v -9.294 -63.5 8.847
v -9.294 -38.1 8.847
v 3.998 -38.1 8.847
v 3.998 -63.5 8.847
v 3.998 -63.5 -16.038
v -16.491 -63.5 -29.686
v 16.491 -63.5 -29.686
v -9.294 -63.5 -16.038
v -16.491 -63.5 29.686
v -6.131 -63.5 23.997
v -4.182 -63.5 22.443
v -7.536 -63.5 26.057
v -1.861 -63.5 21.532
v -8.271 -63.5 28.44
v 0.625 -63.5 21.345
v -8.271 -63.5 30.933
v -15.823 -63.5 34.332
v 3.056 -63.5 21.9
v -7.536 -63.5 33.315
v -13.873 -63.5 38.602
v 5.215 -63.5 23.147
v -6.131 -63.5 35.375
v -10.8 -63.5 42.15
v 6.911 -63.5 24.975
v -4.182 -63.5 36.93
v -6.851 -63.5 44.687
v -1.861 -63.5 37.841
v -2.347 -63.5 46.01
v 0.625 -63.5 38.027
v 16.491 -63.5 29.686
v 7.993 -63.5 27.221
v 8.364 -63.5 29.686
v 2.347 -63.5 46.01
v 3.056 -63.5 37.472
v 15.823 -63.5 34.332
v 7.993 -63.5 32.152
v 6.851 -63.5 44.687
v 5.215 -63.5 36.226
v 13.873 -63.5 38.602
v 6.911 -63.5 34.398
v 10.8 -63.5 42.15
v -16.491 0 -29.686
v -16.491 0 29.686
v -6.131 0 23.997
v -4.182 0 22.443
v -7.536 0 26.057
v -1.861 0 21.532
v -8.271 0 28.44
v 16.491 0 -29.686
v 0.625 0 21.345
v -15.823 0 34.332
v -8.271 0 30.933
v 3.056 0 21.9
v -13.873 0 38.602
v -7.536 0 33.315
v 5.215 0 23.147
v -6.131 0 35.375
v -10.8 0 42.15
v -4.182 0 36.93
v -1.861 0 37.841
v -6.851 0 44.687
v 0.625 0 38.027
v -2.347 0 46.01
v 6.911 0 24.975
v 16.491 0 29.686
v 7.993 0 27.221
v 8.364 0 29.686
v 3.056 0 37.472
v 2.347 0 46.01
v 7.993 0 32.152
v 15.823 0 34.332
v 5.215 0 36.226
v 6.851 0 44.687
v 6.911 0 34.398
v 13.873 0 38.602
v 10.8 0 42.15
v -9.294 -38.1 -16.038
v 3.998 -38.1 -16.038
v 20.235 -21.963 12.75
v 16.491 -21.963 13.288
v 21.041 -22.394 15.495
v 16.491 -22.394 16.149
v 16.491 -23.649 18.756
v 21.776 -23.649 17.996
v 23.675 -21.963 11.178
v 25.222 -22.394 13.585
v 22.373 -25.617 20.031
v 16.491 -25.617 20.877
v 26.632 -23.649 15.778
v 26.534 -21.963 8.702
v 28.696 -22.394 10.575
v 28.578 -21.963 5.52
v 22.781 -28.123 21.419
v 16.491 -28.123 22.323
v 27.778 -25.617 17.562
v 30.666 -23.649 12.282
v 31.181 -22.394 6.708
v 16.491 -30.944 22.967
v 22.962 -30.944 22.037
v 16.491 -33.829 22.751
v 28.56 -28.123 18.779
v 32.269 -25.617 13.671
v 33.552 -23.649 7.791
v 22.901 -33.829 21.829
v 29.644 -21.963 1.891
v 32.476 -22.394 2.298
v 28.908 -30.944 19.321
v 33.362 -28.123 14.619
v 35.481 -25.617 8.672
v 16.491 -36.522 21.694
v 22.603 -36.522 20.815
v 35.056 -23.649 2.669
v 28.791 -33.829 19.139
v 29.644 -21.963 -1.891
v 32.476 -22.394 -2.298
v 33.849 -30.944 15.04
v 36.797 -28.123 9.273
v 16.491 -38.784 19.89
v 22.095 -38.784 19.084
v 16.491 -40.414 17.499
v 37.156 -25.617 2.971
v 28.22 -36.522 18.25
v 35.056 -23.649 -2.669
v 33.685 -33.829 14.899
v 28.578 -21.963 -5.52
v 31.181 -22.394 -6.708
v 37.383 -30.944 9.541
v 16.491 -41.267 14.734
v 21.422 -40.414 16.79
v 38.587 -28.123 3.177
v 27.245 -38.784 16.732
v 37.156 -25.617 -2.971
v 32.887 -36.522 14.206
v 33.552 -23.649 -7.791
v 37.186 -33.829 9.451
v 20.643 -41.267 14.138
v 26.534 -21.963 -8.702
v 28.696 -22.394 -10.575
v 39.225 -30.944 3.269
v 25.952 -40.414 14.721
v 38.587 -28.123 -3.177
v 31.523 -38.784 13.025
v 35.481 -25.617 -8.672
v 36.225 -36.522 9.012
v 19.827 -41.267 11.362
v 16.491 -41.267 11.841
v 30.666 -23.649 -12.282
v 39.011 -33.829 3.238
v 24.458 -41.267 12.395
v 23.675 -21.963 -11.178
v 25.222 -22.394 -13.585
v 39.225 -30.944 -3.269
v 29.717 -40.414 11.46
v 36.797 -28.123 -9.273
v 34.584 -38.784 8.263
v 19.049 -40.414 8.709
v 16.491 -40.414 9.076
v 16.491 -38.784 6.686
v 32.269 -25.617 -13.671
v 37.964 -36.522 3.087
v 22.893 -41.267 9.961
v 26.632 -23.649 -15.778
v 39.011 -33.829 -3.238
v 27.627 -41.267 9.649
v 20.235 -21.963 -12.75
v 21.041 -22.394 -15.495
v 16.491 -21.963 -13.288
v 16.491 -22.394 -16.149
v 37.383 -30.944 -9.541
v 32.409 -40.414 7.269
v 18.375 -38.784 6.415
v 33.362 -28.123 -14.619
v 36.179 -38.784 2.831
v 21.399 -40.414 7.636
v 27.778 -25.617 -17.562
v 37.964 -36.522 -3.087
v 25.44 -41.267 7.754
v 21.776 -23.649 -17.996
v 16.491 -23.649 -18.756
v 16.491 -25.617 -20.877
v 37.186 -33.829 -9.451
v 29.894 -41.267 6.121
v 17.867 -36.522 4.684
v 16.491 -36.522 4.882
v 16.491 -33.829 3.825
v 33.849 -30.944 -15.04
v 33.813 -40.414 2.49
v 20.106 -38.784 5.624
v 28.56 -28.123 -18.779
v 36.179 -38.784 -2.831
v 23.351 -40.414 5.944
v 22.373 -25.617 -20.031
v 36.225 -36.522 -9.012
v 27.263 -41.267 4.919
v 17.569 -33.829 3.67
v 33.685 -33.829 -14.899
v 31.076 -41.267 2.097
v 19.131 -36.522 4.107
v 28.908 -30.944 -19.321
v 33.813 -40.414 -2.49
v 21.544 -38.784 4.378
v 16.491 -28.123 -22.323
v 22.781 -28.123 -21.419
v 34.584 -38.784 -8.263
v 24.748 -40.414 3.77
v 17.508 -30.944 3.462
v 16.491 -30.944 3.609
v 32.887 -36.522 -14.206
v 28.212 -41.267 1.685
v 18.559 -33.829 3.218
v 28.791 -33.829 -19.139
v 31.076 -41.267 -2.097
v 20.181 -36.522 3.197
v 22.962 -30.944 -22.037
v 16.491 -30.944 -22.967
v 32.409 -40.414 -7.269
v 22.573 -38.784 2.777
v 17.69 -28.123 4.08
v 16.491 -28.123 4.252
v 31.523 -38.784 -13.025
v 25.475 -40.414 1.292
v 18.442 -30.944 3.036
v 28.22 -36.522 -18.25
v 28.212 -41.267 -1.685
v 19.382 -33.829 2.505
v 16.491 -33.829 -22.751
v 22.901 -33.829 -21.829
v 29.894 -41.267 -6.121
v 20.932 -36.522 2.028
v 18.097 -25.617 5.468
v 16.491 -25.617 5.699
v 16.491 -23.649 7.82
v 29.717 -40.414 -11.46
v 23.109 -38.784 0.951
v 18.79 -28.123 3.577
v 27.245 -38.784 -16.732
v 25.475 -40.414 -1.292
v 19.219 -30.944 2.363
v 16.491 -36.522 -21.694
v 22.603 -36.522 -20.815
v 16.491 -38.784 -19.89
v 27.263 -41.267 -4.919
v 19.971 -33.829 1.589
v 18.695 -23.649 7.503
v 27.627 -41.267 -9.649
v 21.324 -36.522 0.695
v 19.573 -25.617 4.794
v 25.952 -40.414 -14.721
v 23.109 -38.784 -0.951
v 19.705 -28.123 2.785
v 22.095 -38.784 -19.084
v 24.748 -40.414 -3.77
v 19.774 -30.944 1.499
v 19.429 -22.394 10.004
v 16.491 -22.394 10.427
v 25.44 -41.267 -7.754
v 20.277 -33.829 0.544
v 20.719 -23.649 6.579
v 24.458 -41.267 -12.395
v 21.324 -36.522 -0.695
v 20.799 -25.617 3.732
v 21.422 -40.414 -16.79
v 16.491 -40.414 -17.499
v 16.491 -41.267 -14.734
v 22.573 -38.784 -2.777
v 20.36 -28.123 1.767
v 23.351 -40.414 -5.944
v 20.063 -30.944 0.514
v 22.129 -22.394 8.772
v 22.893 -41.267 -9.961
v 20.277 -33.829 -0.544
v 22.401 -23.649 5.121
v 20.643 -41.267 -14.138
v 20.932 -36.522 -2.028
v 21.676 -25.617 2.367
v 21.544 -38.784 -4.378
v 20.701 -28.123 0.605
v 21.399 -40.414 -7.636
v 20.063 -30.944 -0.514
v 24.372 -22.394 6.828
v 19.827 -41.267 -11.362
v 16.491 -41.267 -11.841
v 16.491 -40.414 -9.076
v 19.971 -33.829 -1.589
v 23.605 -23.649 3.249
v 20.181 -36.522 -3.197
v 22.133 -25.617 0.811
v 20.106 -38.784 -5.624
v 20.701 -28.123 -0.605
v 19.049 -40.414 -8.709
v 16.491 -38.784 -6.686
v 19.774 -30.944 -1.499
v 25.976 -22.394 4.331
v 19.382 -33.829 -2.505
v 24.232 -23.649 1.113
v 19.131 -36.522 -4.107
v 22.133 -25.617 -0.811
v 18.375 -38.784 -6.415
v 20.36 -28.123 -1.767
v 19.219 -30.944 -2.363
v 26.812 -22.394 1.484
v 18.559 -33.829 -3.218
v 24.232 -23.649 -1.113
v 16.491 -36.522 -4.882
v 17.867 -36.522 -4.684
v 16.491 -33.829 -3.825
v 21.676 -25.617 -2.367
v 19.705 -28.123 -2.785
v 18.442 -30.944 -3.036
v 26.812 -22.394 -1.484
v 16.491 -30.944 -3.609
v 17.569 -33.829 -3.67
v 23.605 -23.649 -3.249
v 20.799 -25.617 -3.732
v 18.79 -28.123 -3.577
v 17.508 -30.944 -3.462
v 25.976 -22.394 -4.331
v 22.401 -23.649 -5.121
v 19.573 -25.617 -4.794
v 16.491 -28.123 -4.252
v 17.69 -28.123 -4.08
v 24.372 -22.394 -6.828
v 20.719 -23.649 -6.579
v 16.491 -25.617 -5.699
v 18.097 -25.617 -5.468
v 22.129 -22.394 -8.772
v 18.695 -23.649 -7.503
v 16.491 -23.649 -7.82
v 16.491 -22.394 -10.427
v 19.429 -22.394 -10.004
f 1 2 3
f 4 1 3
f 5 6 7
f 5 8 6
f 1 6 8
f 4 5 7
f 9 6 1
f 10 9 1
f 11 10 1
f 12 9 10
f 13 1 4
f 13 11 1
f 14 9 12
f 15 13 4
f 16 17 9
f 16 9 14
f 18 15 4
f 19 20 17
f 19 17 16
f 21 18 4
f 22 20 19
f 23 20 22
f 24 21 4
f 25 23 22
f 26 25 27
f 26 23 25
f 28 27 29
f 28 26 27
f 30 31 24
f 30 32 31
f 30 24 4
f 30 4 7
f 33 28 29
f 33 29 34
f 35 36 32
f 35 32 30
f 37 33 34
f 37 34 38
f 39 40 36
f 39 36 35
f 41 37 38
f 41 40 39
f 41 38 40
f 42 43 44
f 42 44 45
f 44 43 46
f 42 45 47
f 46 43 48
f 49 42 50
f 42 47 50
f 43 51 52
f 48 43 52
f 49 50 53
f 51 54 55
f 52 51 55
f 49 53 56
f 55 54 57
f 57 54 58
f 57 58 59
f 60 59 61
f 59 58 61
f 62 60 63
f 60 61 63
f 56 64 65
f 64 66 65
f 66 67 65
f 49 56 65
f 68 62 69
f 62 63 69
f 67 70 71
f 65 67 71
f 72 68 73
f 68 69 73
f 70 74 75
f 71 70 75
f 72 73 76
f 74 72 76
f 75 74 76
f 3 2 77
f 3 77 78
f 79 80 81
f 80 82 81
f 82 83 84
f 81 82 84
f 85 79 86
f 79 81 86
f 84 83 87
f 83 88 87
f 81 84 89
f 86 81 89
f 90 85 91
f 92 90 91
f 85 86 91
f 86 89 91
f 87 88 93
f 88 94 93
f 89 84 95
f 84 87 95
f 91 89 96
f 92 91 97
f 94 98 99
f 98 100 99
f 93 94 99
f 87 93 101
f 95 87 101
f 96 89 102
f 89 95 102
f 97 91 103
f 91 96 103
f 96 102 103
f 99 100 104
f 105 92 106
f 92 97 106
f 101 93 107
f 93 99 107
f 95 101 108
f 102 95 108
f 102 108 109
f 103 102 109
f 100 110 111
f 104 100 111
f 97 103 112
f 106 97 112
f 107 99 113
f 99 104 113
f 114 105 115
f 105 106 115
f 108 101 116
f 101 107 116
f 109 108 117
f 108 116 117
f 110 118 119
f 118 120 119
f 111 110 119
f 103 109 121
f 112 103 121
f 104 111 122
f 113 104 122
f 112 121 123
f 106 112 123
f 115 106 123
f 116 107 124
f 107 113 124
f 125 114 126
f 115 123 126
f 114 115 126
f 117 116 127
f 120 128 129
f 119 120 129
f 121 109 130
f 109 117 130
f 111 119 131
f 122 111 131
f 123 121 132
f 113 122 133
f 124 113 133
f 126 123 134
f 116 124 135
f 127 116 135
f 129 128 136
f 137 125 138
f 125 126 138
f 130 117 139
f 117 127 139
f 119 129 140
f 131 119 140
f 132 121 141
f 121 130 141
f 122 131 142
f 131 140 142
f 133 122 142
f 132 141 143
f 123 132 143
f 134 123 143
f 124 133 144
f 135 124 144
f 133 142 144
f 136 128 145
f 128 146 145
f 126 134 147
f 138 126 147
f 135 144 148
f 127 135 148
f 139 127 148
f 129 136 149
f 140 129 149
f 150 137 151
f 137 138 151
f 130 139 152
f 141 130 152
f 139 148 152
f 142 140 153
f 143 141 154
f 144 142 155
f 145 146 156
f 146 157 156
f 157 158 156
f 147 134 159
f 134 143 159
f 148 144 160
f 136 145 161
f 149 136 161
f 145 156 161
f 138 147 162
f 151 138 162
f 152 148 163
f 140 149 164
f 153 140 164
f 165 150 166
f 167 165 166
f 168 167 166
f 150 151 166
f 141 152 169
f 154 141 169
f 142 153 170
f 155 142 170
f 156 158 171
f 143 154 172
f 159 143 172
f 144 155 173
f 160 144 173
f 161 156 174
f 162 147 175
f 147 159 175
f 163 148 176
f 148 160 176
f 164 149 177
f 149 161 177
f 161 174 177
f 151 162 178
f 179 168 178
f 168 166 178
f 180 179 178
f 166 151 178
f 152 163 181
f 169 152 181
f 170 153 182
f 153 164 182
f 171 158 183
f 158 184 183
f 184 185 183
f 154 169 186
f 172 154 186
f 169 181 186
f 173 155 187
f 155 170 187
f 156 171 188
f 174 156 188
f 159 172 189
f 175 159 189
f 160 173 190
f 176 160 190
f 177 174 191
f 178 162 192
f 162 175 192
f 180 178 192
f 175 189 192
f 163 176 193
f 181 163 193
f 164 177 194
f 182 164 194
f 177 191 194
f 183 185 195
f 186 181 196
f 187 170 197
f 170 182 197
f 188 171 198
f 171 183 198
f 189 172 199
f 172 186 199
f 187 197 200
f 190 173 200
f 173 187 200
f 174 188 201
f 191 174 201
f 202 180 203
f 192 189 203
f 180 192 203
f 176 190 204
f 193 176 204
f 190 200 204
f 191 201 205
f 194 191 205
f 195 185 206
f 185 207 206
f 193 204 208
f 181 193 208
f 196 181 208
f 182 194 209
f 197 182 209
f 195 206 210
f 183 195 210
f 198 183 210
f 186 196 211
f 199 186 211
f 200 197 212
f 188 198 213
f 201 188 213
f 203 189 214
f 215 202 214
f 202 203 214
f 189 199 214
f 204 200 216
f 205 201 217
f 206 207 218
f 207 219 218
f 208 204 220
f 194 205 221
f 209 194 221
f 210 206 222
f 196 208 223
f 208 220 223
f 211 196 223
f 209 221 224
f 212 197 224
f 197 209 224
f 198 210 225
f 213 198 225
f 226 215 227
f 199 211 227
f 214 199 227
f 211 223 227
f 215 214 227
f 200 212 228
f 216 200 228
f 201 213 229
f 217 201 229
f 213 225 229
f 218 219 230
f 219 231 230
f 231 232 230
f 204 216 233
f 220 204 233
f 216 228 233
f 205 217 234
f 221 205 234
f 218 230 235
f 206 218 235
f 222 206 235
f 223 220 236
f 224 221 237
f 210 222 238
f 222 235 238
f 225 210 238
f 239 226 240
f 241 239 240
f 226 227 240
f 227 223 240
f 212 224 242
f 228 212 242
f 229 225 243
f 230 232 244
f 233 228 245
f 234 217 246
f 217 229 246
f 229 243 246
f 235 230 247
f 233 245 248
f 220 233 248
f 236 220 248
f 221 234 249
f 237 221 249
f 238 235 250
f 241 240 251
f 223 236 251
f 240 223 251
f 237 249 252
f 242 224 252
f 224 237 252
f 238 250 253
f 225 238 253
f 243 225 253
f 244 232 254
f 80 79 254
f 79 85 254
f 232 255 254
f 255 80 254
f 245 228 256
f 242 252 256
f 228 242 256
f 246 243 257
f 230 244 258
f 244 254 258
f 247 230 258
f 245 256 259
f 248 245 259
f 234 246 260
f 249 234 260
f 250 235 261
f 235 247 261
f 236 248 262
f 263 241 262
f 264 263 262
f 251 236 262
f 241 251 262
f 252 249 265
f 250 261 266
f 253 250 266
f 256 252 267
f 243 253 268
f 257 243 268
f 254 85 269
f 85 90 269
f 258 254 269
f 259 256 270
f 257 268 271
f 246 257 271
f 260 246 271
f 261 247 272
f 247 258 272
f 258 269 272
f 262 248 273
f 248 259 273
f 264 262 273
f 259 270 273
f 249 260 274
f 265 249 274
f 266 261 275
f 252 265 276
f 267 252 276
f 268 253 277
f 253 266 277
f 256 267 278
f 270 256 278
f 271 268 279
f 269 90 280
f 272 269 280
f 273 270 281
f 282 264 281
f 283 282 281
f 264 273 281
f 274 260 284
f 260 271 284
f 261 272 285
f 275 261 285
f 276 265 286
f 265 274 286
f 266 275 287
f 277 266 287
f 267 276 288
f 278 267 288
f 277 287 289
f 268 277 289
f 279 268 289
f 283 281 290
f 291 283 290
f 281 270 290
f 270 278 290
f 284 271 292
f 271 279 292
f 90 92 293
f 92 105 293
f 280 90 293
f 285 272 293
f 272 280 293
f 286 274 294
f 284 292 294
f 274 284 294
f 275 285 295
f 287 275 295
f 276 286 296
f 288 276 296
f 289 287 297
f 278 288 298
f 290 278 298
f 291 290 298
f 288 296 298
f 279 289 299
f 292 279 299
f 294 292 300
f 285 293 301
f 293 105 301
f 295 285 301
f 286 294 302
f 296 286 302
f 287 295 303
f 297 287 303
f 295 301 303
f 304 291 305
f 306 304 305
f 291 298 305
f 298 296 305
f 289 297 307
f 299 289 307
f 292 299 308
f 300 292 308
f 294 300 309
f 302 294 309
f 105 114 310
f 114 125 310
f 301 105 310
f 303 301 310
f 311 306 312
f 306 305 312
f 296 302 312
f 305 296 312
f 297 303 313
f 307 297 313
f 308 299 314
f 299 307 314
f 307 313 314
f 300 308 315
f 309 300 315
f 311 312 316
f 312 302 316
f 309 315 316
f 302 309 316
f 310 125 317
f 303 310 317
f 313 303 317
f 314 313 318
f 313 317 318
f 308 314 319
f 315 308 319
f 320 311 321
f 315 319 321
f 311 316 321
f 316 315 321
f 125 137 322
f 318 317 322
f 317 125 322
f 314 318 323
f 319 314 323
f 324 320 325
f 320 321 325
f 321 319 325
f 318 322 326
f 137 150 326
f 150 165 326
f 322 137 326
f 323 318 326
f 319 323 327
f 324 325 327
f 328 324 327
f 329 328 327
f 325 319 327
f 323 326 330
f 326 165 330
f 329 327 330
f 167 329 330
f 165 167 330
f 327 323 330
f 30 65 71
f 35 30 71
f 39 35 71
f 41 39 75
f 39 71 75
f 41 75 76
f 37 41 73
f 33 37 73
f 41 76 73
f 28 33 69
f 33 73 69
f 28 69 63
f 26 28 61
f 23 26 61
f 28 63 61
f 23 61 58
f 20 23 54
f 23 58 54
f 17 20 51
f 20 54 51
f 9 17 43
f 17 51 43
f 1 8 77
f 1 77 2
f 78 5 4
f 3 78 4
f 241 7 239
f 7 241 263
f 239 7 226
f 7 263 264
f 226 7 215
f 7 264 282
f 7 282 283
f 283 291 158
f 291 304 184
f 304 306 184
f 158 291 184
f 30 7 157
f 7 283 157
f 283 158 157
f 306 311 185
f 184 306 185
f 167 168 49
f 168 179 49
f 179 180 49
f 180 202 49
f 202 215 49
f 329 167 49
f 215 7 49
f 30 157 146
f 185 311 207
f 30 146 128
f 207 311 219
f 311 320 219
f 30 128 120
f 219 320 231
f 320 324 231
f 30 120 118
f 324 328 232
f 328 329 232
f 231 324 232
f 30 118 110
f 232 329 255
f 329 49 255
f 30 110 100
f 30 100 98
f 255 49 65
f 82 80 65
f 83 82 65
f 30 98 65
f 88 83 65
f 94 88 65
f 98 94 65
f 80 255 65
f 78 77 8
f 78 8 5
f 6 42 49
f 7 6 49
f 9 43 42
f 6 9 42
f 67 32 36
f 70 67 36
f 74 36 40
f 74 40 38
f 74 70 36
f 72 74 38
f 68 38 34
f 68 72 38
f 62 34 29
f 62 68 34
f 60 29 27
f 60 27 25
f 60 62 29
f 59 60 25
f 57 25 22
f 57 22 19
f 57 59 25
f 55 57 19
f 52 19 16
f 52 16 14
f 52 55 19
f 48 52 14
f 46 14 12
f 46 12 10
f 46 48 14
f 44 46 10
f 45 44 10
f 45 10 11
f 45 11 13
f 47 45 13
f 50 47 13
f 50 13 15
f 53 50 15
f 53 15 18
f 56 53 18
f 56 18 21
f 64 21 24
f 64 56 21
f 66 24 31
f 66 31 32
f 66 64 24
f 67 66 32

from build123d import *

# Parameters (mm, degrees)
F0_R     = 8.3642663508
F1_DEPTH = 63.5
F2_W     = 13.291940093
F2_H     = 24.8854812235
F3_DEPTH = 25.4
F4_R     = 9.7063550573
F5_ANGLE = 180


# Not quite as in the source:
# - a feature names something its author has since deleted; it is built from what else it names


with BuildPart() as f1:
    # F0 (on Front) → F1 (new body)
    with BuildSketch(Plane.XZ):
        with BuildLine():
            Line((-16.4914578199, -29.6862870455), (16.4914578199, -29.6862870455))
            Line((16.4914578199, -29.6862870455), (16.4914578199, 29.6862870455))
            ThreePointArc((16.4914578199, 29.6862870455), (0, 46.1777448654), (-16.4914578199, 29.6862870455))
            Line((-16.4914578199, 29.6862870455), (-16.4914578199, -29.6862870455))
        make_face()
        with Locations((0, 29.6862870455)):
            Circle(F0_R, mode=Mode.SUBTRACT)
    extrude(amount=F1_DEPTH)

    # F2 (on face) → F3 (cut)
    with BuildSketch(Plane.XZ.offset(63.5)):
        with Locations((-2.6479512453, -3.5954387859)):
            Rectangle(F2_W, F2_H)
    extrude(amount=-F3_DEPTH, mode=Mode.SUBTRACT)

    # F4 (on face) → F5 (revolve)
    with BuildSketch(Plane.YZ.offset(16.4914578199)):
        with Locations((-31.6691994667, 13.287819922)):
            Circle(F4_R)
    revolve(axis=Axis((16.4914578199, -31.75, 0), (0, 1, 0)), revolution_arc=F5_ANGLE)


solid = f1.part
